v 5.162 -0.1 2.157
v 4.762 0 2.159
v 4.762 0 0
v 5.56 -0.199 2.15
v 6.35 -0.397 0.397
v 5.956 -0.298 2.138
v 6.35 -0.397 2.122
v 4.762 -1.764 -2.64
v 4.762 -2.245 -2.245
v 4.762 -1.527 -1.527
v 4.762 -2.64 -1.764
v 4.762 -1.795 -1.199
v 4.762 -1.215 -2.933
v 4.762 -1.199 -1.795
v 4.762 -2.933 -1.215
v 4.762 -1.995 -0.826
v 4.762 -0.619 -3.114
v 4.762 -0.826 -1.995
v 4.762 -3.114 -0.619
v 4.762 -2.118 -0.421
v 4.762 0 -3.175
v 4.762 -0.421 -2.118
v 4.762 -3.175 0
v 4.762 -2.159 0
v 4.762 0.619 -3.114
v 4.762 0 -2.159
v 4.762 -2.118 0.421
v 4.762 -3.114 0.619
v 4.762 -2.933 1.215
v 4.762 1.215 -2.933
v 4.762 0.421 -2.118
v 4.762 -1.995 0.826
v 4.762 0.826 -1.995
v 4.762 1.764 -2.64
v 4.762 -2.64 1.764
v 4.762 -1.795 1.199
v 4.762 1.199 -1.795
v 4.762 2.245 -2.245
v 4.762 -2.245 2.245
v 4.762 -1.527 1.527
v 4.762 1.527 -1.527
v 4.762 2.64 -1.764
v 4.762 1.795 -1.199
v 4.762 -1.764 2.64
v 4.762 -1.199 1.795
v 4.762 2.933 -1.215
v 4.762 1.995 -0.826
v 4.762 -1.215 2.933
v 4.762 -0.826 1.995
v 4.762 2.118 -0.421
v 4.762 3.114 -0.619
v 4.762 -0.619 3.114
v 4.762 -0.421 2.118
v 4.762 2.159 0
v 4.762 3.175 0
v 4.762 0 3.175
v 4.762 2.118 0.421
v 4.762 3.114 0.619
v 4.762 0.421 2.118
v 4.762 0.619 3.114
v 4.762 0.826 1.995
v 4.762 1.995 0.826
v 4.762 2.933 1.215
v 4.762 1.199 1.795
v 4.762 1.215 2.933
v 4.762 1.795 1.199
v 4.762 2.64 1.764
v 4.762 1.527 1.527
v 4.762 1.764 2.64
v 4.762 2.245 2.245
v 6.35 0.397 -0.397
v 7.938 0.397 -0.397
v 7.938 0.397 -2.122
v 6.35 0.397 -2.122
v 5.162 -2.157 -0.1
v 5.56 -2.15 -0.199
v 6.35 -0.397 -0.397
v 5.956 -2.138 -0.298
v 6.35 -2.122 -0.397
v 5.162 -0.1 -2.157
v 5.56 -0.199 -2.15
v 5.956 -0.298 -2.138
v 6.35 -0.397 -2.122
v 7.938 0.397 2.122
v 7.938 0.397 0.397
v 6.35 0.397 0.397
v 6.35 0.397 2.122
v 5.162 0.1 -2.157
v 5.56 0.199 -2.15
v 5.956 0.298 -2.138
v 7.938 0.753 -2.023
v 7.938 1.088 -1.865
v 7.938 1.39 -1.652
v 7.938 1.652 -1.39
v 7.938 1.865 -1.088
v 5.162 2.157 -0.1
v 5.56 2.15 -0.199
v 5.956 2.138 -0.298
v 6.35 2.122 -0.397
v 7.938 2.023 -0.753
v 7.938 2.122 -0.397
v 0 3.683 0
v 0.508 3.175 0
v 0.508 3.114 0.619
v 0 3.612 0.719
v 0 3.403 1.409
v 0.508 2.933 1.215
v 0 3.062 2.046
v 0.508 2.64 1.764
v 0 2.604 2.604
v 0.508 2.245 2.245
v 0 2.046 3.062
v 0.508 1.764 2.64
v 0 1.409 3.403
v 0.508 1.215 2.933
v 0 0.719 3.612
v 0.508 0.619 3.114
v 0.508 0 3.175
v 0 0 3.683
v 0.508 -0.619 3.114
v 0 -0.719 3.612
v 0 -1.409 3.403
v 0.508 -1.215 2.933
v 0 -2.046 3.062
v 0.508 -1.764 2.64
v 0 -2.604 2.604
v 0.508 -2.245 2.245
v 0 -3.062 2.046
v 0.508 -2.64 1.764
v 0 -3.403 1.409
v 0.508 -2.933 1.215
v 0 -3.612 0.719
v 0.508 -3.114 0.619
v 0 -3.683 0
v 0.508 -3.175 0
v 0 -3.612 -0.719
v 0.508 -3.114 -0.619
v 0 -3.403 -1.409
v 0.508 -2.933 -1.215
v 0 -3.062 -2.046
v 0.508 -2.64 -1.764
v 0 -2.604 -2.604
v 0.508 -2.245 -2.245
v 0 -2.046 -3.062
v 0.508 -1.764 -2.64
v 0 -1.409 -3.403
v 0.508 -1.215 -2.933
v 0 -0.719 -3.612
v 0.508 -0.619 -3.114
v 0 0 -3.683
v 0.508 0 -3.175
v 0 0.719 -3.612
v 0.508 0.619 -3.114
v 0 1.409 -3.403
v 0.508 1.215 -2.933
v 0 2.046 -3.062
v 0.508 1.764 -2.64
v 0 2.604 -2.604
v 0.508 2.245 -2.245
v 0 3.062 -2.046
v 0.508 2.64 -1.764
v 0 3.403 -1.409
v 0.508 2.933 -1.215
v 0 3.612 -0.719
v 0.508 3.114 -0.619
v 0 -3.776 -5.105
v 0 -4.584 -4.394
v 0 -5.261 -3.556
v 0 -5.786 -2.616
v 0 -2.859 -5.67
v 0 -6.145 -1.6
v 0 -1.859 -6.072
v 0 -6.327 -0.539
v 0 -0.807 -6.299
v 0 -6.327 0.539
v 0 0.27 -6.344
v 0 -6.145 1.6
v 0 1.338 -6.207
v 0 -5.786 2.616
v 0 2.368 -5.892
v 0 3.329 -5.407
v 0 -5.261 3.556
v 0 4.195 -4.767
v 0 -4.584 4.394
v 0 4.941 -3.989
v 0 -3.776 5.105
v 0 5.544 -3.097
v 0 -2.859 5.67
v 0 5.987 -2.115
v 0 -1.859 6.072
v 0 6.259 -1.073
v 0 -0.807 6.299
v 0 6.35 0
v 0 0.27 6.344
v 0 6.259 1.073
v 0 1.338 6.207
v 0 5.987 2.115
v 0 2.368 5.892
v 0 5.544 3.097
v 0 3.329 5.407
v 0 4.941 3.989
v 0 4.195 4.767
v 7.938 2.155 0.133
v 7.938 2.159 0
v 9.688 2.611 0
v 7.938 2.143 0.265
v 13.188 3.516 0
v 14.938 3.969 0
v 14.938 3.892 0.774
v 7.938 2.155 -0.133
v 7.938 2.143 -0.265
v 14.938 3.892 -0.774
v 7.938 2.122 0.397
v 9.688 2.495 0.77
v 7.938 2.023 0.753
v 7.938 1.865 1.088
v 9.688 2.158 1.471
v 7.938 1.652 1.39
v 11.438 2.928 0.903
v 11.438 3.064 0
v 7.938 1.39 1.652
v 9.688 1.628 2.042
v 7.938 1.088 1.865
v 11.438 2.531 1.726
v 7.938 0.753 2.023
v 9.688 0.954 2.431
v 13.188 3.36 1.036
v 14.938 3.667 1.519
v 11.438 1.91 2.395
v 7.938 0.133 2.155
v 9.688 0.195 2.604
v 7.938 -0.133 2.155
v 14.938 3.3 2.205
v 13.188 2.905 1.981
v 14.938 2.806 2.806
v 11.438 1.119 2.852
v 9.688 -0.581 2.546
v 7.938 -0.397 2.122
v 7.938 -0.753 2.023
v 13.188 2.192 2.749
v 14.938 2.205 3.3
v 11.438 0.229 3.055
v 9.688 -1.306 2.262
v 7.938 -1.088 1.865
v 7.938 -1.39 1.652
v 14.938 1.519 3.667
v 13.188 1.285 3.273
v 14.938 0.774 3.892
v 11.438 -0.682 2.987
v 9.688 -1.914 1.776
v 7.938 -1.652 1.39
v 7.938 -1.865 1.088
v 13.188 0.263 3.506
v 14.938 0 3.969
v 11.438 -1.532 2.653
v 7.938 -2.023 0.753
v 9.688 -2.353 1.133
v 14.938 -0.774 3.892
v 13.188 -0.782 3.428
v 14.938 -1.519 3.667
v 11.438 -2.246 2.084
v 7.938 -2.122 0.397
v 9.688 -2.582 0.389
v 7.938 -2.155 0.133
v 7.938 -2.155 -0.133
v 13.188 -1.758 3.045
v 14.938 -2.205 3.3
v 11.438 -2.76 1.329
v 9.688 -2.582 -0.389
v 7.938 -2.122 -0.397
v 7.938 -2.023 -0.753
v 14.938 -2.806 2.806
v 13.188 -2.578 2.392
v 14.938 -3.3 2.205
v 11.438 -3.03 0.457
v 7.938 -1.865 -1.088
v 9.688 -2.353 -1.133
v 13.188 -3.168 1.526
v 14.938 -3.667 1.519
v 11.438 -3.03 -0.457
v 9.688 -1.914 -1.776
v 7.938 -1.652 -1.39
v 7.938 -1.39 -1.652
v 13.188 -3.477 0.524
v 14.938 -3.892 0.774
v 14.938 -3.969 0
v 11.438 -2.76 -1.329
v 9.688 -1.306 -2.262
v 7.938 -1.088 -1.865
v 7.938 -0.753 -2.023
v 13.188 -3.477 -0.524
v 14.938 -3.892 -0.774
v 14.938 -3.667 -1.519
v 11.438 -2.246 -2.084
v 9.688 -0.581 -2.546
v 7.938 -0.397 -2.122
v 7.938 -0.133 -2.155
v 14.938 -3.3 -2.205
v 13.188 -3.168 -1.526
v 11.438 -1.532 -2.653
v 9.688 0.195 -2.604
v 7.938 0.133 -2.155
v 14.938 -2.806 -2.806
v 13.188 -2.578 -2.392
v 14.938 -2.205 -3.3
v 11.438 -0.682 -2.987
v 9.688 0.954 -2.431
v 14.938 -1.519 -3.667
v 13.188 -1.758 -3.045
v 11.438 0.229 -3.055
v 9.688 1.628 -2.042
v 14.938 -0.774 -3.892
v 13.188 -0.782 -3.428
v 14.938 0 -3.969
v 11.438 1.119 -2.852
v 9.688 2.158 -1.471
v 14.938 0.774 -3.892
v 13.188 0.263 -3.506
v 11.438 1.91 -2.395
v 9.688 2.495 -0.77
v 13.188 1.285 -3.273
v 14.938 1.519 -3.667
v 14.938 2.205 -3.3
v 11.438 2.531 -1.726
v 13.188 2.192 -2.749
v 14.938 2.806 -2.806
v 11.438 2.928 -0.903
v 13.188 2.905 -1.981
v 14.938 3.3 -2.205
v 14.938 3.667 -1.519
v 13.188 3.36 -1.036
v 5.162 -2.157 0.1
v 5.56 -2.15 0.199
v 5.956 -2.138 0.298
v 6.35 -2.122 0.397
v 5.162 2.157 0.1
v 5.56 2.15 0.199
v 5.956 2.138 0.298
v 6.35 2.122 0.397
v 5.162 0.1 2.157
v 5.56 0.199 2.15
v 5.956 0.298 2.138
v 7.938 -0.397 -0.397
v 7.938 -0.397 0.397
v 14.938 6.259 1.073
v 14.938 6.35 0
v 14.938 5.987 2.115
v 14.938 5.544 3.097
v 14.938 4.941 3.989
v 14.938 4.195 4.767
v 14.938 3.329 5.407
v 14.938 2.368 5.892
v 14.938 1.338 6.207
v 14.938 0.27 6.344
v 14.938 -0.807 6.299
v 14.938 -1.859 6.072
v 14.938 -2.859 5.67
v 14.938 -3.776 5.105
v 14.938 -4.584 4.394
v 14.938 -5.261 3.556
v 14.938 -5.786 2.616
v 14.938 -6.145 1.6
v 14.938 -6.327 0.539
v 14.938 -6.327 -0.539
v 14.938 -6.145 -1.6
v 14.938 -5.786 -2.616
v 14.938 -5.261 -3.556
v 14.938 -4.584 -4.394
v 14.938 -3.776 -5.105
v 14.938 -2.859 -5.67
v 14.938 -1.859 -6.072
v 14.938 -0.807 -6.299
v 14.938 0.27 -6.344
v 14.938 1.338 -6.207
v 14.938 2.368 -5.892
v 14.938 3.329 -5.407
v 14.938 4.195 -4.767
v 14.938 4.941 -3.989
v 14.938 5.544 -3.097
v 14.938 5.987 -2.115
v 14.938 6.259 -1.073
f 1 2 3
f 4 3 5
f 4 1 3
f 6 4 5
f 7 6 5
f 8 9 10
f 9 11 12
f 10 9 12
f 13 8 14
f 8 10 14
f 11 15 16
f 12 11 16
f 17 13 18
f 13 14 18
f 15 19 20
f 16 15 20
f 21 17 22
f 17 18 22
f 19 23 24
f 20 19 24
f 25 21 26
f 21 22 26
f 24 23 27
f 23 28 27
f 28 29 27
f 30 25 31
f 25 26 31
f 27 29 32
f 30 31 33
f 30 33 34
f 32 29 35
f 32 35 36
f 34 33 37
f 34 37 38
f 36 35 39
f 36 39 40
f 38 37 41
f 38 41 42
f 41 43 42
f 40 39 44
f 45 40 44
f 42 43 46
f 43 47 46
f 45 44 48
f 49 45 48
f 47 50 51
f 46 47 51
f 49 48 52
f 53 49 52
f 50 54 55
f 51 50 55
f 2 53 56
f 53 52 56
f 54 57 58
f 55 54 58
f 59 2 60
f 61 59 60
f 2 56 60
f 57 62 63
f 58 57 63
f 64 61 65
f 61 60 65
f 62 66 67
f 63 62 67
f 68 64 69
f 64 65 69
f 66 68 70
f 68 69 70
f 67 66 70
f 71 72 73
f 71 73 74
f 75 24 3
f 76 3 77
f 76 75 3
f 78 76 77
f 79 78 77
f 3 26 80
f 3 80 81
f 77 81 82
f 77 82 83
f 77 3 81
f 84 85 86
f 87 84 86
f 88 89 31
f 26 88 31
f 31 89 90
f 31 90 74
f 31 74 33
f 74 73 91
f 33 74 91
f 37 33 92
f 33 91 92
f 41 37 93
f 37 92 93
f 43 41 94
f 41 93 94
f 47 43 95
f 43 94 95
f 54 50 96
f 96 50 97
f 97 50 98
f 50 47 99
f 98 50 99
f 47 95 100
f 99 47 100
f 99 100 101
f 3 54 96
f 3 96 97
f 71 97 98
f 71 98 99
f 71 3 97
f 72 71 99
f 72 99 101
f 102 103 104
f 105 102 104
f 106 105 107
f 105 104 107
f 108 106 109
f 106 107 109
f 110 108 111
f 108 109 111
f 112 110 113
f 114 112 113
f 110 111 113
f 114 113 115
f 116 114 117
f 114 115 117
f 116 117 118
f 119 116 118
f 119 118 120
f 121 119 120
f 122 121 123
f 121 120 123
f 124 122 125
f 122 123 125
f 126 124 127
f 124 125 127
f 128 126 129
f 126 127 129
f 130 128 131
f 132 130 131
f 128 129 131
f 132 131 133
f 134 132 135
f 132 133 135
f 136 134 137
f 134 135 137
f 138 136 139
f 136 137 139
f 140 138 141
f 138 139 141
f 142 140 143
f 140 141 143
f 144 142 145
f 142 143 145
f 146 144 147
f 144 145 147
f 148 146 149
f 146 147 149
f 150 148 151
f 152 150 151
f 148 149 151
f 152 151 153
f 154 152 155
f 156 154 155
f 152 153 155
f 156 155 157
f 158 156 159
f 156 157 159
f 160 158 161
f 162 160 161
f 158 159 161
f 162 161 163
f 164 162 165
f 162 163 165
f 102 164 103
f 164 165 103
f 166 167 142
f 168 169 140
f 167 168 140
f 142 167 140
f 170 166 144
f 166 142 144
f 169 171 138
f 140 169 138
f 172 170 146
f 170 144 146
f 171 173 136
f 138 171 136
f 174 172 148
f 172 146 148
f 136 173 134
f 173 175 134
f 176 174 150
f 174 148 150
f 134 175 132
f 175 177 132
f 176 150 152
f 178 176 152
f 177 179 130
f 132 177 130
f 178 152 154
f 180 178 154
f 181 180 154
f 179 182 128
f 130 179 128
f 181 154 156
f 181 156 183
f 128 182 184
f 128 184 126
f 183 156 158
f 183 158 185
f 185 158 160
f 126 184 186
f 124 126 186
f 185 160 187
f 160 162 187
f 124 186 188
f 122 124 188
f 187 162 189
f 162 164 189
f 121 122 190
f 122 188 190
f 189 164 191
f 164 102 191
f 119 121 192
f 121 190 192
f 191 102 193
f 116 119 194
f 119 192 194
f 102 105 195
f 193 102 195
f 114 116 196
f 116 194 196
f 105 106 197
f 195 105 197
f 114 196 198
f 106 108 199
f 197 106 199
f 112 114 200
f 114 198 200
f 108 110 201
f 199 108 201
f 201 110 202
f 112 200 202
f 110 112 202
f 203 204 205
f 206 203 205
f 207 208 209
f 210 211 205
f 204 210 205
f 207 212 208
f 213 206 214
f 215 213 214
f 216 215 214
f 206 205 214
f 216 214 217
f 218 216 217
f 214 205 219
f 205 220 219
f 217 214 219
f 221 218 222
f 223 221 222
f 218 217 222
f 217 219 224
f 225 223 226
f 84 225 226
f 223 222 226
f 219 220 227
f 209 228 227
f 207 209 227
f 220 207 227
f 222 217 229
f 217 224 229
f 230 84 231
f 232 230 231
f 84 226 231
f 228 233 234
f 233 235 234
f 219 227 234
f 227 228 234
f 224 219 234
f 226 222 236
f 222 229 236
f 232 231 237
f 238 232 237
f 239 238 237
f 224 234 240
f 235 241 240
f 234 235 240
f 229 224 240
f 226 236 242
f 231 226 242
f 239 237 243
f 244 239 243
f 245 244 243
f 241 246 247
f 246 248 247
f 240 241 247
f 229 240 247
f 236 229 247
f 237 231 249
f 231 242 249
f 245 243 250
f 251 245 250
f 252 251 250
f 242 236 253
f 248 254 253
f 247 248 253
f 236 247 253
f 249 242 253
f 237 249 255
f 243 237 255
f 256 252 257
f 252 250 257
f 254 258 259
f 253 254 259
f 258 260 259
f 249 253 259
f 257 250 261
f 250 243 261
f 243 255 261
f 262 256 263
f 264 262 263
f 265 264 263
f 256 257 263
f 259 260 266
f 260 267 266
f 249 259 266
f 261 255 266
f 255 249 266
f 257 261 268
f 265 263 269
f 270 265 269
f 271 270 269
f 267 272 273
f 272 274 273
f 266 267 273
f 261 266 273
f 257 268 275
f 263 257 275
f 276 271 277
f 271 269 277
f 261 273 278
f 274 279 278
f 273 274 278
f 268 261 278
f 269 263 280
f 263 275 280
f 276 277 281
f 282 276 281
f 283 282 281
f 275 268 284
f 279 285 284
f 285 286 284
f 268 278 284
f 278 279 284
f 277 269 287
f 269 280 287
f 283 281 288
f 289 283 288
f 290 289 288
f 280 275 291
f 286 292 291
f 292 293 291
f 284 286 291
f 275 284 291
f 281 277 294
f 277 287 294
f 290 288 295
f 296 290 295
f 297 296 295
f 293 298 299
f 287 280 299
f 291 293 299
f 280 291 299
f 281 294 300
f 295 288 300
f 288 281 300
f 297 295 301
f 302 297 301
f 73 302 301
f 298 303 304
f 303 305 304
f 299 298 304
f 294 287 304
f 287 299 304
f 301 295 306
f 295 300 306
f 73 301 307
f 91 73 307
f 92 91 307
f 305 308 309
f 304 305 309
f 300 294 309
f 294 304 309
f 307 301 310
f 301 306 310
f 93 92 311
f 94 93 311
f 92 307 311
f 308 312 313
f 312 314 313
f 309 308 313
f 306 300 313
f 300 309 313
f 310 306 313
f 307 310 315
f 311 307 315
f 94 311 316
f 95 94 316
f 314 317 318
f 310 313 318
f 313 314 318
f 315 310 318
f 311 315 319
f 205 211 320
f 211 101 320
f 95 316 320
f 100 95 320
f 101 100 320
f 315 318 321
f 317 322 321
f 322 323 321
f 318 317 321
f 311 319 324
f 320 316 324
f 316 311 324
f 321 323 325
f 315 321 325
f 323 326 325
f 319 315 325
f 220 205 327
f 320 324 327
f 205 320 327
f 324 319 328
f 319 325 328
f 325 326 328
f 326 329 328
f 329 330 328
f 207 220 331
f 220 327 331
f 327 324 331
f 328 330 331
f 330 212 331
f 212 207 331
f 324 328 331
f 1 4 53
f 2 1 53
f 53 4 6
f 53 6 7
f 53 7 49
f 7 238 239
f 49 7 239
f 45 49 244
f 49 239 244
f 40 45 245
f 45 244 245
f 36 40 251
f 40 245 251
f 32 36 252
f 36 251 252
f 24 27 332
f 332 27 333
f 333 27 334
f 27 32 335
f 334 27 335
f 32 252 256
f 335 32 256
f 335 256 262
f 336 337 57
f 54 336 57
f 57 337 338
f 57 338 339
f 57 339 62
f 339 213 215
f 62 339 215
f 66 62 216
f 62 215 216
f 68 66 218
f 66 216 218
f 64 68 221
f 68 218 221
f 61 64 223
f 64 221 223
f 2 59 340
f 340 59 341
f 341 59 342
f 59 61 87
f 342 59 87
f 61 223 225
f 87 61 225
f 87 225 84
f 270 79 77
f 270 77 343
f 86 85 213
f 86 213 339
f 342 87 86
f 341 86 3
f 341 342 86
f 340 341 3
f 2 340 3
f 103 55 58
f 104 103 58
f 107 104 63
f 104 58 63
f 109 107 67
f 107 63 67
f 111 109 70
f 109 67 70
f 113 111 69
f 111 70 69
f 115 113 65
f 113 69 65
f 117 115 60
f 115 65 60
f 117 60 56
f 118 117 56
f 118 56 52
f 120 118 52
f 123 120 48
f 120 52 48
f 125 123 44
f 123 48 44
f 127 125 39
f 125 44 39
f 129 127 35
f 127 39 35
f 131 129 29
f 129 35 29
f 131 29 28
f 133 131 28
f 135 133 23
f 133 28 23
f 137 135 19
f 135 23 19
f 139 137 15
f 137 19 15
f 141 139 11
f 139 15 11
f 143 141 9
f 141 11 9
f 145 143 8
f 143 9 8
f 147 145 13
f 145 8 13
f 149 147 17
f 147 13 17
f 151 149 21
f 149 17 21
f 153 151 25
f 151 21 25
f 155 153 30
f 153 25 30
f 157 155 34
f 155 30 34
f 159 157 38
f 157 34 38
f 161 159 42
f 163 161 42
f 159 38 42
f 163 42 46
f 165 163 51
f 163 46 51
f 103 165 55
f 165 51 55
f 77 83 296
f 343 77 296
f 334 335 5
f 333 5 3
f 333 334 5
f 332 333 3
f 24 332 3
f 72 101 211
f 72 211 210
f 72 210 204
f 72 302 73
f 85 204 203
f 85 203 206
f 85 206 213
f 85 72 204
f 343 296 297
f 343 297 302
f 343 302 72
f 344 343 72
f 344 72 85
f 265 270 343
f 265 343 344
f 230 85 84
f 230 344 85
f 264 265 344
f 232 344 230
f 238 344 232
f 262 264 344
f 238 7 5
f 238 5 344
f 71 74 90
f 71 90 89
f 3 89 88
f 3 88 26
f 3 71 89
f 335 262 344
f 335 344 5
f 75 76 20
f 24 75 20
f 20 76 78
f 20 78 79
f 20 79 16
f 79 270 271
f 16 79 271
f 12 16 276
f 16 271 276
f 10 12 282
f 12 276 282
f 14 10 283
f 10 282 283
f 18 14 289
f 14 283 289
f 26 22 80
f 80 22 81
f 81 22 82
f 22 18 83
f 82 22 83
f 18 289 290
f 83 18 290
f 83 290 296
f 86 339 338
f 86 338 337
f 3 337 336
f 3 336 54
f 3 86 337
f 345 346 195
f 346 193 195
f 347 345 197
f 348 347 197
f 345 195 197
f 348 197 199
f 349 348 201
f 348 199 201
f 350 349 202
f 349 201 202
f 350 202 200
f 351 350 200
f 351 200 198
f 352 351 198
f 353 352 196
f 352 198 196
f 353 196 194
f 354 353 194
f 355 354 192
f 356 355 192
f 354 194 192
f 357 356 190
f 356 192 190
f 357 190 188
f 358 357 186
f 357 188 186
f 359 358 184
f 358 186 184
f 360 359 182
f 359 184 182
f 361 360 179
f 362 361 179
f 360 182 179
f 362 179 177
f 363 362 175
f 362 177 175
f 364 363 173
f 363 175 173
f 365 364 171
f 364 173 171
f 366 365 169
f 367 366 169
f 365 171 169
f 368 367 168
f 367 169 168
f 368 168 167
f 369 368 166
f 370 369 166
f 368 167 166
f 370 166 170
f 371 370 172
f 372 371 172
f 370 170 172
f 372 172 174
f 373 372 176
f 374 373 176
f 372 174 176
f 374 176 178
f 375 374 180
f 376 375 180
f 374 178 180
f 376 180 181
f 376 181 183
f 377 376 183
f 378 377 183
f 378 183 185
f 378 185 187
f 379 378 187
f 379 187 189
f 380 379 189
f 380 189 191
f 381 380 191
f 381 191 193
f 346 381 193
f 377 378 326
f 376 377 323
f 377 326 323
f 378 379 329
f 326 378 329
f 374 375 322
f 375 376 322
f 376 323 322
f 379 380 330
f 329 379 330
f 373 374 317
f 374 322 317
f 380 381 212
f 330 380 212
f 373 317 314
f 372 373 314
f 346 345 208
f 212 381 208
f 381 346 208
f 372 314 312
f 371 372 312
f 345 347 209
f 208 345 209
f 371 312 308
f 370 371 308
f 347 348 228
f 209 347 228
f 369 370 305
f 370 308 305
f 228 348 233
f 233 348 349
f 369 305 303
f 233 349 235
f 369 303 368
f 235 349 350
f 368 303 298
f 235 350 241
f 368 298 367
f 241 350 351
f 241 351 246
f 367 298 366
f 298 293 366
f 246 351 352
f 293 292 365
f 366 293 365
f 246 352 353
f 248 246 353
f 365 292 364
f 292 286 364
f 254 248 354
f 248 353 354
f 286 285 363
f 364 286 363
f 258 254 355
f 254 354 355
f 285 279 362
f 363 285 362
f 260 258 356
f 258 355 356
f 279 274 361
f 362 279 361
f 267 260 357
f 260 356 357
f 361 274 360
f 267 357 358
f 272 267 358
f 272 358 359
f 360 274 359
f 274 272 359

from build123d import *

# Parameters (mm, degrees)
F2_SIZE  = 0.508
F4_DEPTH = 3.175
F5_COUNT = 2
F5_ANGLE = 90


with BuildPart() as f1:
    # F0 (on Top) → F1 (revolve)
    with BuildSketch(Plane.XY):
        Polygon((14.9375, 6.35), (0, 6.35), (0, 3.175), (4.7625, 3.175), (4.7625, 2.159), (7.9375, 2.159), (14.9375, 3.96875), align=None)
    revolve(axis=Axis((21.9021170629, 0, 0), (1, 0, 0)))

    # F2
    f2_edges = [f1.edges().sort_by_distance(p)[0] for p in [
        (0, -3.175, 0),
    ]]
    chamfer(f2_edges, length=F2_SIZE)



with BuildPart() as f4:
    # F3 (on Top) → F4 (new body, symmetric)
    with BuildSketch(Plane.XY):
        Polygon((6.35, 0.396875), (4.7625, 0), (6.35, -0.396875), (7.9375, -0.396875), (7.9375, 0.396875), align=None)
    extrude(amount=F4_DEPTH, both=True)


with BuildPart() as f1_1:
    add(f1.part)

    add(f4.part)  # F5 merges F4
    # F5: F4 ×2 about axis
    f5_axis = Axis((4.7625, 0, 0), (1, 0, 0))
    for i in range(1, F5_COUNT):
        add(f4.part.rotate(f5_axis, i * F5_ANGLE / (F5_COUNT - 1)))


solid = f1_1.part
